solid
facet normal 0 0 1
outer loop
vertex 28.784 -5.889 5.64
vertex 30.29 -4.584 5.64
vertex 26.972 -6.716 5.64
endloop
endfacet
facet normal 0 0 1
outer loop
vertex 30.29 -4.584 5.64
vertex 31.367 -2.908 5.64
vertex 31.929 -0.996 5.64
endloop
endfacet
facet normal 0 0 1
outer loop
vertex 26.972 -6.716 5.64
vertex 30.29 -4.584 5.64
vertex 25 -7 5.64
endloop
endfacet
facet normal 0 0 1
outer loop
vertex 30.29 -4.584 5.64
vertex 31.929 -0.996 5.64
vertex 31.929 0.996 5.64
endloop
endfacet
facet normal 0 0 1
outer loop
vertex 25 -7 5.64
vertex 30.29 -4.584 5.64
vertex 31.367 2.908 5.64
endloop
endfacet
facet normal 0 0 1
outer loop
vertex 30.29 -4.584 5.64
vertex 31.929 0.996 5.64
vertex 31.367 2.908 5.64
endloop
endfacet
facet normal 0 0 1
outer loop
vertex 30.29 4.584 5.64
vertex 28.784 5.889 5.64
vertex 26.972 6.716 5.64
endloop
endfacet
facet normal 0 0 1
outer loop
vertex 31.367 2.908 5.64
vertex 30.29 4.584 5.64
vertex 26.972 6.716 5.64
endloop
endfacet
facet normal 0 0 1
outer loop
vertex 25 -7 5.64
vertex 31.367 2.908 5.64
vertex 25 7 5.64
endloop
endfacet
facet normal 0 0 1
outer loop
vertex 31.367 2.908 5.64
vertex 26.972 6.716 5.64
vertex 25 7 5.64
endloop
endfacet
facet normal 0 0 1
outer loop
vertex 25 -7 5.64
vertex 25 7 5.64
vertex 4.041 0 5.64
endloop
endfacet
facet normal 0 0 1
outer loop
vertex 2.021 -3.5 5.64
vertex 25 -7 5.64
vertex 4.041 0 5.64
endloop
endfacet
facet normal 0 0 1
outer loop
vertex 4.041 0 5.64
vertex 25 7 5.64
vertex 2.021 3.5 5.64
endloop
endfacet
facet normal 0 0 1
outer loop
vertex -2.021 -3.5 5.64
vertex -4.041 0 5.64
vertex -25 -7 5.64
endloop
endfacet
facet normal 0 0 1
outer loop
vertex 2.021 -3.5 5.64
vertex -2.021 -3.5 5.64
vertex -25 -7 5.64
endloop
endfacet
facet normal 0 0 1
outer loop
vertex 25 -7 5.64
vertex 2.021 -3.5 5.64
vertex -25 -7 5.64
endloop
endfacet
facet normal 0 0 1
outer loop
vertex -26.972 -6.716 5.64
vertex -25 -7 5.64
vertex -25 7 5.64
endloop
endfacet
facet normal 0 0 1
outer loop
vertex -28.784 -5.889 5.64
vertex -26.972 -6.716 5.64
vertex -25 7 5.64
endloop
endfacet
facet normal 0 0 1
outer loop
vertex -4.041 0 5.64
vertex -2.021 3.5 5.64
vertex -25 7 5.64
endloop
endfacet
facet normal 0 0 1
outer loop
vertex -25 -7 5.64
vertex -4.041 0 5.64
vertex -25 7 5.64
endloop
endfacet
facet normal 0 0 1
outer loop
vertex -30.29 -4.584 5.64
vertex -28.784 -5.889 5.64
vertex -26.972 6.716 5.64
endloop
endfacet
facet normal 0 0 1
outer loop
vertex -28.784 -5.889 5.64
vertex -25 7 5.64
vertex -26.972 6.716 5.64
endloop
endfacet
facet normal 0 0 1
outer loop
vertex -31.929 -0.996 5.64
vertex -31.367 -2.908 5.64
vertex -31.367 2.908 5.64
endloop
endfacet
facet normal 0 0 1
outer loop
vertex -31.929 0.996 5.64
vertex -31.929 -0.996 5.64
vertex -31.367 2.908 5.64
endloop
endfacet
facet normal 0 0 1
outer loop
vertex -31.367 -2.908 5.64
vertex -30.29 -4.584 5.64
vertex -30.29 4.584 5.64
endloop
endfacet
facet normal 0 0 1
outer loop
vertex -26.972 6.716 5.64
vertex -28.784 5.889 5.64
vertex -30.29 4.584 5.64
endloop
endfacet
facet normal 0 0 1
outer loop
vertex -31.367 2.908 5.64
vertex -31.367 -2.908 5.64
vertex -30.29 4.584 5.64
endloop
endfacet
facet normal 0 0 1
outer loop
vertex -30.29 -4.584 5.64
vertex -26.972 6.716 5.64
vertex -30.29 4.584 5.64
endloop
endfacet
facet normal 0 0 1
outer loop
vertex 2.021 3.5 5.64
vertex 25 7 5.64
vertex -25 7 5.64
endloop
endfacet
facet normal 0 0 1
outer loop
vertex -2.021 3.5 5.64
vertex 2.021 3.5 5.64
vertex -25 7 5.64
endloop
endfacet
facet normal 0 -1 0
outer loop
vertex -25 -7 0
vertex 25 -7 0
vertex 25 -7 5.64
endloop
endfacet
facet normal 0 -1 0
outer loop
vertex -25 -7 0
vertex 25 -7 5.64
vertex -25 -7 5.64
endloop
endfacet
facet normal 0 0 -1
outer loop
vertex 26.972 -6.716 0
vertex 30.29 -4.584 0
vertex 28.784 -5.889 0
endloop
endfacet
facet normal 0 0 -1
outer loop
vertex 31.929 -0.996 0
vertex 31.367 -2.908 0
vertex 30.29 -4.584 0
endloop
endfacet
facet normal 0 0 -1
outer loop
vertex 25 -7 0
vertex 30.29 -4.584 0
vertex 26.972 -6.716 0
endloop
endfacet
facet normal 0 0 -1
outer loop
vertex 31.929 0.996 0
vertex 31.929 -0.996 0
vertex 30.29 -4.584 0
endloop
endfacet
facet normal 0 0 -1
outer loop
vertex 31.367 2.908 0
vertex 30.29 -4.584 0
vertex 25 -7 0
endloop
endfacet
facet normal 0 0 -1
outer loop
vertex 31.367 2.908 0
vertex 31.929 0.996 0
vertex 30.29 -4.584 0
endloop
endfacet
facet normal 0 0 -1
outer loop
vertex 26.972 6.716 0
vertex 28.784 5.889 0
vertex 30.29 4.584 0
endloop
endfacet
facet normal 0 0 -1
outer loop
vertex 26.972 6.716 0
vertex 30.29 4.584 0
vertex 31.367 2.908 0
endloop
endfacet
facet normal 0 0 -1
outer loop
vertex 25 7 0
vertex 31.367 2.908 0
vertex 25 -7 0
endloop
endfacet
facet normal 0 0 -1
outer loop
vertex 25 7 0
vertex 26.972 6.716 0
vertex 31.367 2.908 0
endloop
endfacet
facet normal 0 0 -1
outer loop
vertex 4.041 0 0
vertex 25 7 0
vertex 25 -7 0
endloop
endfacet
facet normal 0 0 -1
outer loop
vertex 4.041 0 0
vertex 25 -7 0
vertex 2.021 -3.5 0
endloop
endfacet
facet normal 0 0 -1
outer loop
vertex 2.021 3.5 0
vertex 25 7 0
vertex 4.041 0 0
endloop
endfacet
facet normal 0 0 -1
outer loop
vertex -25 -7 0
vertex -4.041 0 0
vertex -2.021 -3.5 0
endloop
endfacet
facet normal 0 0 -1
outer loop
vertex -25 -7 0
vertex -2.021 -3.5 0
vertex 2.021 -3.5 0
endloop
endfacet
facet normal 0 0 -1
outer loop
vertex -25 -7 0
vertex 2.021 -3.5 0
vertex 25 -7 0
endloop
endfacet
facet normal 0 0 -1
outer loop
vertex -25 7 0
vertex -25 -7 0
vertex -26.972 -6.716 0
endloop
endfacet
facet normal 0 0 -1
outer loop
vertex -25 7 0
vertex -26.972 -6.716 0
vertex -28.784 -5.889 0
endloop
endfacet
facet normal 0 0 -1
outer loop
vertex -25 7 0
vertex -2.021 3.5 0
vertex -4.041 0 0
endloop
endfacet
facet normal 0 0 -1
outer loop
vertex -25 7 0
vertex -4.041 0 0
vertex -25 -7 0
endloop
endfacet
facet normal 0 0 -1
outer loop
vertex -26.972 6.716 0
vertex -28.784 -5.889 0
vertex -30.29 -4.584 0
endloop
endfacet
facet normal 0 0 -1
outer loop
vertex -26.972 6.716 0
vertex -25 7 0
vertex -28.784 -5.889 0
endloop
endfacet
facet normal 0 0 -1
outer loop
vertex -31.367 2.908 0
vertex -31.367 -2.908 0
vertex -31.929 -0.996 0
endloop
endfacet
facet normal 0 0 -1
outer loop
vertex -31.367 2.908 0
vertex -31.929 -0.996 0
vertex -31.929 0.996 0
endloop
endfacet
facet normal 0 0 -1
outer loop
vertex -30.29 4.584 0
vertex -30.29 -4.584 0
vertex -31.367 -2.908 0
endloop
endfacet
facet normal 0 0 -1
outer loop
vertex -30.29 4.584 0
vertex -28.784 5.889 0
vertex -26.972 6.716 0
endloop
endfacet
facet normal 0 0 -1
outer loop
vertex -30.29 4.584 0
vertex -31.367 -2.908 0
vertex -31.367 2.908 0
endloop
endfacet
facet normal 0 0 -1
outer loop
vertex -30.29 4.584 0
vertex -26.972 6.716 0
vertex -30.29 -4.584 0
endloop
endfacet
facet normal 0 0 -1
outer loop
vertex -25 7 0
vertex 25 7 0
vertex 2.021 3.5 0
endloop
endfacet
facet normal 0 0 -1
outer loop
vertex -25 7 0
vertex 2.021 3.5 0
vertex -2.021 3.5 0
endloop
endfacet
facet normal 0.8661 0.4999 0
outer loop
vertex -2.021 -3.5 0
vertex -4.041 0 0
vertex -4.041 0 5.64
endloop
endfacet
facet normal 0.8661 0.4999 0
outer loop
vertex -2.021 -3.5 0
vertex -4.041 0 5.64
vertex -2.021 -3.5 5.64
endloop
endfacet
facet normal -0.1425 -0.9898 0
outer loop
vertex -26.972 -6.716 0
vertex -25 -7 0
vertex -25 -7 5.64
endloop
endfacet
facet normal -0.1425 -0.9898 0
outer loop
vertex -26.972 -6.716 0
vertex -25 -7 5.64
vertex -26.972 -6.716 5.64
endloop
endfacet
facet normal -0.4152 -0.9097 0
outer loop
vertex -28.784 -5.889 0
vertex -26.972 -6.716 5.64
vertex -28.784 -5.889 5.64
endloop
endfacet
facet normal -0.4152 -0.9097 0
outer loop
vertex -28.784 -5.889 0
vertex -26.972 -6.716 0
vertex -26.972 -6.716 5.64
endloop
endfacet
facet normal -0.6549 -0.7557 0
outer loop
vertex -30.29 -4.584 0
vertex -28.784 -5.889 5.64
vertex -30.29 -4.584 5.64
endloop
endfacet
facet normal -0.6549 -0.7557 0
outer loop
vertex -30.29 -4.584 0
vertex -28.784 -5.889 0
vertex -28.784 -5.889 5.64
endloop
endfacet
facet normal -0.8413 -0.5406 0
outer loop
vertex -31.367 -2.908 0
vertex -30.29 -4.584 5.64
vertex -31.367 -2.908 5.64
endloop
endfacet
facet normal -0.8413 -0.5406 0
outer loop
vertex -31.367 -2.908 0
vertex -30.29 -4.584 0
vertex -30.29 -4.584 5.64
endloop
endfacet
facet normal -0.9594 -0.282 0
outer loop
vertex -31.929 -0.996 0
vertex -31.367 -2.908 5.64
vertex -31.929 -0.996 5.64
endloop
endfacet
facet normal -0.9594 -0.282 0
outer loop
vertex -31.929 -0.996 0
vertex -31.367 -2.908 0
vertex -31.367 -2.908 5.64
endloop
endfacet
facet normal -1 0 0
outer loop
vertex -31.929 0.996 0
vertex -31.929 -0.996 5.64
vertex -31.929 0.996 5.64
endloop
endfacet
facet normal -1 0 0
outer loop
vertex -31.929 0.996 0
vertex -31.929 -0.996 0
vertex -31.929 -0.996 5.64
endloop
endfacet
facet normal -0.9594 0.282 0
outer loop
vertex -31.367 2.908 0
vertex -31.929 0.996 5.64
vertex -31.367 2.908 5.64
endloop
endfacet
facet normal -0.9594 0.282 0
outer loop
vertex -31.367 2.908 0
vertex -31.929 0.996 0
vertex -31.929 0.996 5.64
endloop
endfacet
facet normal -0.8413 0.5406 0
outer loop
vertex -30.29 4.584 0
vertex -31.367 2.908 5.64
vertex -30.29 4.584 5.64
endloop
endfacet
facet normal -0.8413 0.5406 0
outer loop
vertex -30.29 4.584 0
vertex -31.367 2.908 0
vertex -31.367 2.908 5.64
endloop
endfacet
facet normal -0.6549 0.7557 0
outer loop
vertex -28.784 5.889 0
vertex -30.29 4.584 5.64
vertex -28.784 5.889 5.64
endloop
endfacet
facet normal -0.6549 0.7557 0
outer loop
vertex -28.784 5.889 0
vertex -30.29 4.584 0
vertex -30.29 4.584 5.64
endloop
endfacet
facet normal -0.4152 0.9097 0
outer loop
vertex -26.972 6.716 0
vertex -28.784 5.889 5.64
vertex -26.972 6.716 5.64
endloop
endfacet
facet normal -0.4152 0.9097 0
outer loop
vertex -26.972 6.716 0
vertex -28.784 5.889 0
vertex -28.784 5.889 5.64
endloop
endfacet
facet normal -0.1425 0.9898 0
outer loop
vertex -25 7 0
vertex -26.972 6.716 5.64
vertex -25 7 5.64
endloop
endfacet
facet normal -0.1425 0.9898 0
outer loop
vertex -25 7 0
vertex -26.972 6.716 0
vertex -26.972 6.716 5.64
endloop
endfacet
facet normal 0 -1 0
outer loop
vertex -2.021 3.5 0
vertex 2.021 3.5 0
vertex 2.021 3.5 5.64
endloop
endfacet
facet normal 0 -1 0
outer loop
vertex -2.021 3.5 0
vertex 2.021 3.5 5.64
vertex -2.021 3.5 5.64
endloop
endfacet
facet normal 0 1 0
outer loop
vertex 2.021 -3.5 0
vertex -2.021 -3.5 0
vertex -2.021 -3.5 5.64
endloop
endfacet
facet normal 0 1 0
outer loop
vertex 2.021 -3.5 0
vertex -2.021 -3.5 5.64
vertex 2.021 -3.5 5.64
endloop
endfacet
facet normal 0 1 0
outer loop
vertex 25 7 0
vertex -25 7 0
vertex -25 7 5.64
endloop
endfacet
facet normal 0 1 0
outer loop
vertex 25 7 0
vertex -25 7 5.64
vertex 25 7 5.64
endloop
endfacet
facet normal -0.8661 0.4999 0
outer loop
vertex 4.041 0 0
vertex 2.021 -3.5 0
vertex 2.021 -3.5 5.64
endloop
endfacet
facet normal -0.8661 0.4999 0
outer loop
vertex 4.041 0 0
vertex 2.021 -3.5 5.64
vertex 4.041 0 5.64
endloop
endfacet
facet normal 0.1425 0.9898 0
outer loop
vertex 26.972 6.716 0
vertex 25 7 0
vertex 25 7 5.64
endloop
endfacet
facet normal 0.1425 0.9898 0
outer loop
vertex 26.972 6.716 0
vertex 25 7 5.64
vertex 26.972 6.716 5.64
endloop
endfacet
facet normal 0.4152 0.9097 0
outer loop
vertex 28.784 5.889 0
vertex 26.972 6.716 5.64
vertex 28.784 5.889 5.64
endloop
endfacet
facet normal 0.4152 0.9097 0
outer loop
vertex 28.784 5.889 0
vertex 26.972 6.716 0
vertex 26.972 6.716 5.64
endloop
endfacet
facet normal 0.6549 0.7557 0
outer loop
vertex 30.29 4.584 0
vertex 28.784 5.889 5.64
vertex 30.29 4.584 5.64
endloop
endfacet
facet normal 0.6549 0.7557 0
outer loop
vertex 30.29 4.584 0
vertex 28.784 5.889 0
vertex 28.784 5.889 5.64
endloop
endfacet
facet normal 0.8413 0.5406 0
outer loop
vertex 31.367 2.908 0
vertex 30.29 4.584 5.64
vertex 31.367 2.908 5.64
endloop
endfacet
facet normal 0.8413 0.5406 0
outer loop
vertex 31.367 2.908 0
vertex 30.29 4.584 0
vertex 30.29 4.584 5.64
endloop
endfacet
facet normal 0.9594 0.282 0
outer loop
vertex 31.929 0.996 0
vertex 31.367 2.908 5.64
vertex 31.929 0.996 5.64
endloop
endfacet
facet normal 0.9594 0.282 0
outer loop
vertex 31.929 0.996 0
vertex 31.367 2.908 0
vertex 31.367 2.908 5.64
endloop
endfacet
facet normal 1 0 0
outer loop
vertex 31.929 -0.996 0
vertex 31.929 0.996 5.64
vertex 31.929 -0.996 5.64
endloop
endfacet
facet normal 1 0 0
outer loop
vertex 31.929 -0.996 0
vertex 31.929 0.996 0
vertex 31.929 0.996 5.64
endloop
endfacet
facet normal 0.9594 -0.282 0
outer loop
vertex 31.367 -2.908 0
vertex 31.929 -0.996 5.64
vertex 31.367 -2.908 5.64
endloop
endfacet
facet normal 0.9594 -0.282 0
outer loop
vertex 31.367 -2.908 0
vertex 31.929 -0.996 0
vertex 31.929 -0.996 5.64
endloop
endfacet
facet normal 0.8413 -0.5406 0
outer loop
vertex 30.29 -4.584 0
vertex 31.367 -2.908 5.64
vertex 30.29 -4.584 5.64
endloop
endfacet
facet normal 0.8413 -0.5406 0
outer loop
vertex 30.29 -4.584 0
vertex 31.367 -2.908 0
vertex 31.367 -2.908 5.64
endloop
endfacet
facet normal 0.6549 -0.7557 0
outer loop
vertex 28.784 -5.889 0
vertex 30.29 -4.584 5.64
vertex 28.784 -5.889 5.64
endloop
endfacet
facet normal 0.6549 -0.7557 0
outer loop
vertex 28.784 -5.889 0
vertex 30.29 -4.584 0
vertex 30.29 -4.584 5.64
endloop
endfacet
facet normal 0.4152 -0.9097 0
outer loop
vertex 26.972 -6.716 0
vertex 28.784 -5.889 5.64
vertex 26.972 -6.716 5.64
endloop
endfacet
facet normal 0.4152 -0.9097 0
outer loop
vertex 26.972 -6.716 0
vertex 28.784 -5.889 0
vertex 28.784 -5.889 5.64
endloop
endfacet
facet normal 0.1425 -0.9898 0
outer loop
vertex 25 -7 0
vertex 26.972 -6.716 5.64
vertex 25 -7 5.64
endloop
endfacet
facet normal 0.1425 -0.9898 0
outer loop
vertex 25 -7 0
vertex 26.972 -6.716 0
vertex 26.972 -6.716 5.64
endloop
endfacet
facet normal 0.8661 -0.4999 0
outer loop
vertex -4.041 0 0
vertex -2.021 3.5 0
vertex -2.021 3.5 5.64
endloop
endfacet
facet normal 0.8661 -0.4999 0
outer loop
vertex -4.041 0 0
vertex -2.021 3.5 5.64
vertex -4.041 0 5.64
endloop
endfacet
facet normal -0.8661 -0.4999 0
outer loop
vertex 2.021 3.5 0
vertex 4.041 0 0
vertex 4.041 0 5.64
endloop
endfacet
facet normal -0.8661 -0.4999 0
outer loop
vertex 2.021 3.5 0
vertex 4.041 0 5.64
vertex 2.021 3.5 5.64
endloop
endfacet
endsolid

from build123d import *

# Parameters (mm, degrees)
BOSS_EXTRUDE2_DEPTH = 5.64


with BuildPart() as part:
    # Sketch1 → Boss-Extrude2 (new body)
    with BuildSketch(Plane.XY):
        with BuildLine():
            Line((-25, 7), (25, 7))
            ThreePointArc((25, 7), (32, 0), (25, -7))
            Line((25, -7), (-25, -7))
            ThreePointArc((-25, -7), (-32, 0), (-25, 7))
        make_face()
        Polygon((-2.020725942, 3.5), (-4.041451884, 0), (-2.020725942, -3.5), (2.020725942, -3.5), (4.041451884, 0), (2.020725942, 3.5), align=None, mode=Mode.SUBTRACT)
    extrude(amount=BOSS_EXTRUDE2_DEPTH)


solid = part.part
